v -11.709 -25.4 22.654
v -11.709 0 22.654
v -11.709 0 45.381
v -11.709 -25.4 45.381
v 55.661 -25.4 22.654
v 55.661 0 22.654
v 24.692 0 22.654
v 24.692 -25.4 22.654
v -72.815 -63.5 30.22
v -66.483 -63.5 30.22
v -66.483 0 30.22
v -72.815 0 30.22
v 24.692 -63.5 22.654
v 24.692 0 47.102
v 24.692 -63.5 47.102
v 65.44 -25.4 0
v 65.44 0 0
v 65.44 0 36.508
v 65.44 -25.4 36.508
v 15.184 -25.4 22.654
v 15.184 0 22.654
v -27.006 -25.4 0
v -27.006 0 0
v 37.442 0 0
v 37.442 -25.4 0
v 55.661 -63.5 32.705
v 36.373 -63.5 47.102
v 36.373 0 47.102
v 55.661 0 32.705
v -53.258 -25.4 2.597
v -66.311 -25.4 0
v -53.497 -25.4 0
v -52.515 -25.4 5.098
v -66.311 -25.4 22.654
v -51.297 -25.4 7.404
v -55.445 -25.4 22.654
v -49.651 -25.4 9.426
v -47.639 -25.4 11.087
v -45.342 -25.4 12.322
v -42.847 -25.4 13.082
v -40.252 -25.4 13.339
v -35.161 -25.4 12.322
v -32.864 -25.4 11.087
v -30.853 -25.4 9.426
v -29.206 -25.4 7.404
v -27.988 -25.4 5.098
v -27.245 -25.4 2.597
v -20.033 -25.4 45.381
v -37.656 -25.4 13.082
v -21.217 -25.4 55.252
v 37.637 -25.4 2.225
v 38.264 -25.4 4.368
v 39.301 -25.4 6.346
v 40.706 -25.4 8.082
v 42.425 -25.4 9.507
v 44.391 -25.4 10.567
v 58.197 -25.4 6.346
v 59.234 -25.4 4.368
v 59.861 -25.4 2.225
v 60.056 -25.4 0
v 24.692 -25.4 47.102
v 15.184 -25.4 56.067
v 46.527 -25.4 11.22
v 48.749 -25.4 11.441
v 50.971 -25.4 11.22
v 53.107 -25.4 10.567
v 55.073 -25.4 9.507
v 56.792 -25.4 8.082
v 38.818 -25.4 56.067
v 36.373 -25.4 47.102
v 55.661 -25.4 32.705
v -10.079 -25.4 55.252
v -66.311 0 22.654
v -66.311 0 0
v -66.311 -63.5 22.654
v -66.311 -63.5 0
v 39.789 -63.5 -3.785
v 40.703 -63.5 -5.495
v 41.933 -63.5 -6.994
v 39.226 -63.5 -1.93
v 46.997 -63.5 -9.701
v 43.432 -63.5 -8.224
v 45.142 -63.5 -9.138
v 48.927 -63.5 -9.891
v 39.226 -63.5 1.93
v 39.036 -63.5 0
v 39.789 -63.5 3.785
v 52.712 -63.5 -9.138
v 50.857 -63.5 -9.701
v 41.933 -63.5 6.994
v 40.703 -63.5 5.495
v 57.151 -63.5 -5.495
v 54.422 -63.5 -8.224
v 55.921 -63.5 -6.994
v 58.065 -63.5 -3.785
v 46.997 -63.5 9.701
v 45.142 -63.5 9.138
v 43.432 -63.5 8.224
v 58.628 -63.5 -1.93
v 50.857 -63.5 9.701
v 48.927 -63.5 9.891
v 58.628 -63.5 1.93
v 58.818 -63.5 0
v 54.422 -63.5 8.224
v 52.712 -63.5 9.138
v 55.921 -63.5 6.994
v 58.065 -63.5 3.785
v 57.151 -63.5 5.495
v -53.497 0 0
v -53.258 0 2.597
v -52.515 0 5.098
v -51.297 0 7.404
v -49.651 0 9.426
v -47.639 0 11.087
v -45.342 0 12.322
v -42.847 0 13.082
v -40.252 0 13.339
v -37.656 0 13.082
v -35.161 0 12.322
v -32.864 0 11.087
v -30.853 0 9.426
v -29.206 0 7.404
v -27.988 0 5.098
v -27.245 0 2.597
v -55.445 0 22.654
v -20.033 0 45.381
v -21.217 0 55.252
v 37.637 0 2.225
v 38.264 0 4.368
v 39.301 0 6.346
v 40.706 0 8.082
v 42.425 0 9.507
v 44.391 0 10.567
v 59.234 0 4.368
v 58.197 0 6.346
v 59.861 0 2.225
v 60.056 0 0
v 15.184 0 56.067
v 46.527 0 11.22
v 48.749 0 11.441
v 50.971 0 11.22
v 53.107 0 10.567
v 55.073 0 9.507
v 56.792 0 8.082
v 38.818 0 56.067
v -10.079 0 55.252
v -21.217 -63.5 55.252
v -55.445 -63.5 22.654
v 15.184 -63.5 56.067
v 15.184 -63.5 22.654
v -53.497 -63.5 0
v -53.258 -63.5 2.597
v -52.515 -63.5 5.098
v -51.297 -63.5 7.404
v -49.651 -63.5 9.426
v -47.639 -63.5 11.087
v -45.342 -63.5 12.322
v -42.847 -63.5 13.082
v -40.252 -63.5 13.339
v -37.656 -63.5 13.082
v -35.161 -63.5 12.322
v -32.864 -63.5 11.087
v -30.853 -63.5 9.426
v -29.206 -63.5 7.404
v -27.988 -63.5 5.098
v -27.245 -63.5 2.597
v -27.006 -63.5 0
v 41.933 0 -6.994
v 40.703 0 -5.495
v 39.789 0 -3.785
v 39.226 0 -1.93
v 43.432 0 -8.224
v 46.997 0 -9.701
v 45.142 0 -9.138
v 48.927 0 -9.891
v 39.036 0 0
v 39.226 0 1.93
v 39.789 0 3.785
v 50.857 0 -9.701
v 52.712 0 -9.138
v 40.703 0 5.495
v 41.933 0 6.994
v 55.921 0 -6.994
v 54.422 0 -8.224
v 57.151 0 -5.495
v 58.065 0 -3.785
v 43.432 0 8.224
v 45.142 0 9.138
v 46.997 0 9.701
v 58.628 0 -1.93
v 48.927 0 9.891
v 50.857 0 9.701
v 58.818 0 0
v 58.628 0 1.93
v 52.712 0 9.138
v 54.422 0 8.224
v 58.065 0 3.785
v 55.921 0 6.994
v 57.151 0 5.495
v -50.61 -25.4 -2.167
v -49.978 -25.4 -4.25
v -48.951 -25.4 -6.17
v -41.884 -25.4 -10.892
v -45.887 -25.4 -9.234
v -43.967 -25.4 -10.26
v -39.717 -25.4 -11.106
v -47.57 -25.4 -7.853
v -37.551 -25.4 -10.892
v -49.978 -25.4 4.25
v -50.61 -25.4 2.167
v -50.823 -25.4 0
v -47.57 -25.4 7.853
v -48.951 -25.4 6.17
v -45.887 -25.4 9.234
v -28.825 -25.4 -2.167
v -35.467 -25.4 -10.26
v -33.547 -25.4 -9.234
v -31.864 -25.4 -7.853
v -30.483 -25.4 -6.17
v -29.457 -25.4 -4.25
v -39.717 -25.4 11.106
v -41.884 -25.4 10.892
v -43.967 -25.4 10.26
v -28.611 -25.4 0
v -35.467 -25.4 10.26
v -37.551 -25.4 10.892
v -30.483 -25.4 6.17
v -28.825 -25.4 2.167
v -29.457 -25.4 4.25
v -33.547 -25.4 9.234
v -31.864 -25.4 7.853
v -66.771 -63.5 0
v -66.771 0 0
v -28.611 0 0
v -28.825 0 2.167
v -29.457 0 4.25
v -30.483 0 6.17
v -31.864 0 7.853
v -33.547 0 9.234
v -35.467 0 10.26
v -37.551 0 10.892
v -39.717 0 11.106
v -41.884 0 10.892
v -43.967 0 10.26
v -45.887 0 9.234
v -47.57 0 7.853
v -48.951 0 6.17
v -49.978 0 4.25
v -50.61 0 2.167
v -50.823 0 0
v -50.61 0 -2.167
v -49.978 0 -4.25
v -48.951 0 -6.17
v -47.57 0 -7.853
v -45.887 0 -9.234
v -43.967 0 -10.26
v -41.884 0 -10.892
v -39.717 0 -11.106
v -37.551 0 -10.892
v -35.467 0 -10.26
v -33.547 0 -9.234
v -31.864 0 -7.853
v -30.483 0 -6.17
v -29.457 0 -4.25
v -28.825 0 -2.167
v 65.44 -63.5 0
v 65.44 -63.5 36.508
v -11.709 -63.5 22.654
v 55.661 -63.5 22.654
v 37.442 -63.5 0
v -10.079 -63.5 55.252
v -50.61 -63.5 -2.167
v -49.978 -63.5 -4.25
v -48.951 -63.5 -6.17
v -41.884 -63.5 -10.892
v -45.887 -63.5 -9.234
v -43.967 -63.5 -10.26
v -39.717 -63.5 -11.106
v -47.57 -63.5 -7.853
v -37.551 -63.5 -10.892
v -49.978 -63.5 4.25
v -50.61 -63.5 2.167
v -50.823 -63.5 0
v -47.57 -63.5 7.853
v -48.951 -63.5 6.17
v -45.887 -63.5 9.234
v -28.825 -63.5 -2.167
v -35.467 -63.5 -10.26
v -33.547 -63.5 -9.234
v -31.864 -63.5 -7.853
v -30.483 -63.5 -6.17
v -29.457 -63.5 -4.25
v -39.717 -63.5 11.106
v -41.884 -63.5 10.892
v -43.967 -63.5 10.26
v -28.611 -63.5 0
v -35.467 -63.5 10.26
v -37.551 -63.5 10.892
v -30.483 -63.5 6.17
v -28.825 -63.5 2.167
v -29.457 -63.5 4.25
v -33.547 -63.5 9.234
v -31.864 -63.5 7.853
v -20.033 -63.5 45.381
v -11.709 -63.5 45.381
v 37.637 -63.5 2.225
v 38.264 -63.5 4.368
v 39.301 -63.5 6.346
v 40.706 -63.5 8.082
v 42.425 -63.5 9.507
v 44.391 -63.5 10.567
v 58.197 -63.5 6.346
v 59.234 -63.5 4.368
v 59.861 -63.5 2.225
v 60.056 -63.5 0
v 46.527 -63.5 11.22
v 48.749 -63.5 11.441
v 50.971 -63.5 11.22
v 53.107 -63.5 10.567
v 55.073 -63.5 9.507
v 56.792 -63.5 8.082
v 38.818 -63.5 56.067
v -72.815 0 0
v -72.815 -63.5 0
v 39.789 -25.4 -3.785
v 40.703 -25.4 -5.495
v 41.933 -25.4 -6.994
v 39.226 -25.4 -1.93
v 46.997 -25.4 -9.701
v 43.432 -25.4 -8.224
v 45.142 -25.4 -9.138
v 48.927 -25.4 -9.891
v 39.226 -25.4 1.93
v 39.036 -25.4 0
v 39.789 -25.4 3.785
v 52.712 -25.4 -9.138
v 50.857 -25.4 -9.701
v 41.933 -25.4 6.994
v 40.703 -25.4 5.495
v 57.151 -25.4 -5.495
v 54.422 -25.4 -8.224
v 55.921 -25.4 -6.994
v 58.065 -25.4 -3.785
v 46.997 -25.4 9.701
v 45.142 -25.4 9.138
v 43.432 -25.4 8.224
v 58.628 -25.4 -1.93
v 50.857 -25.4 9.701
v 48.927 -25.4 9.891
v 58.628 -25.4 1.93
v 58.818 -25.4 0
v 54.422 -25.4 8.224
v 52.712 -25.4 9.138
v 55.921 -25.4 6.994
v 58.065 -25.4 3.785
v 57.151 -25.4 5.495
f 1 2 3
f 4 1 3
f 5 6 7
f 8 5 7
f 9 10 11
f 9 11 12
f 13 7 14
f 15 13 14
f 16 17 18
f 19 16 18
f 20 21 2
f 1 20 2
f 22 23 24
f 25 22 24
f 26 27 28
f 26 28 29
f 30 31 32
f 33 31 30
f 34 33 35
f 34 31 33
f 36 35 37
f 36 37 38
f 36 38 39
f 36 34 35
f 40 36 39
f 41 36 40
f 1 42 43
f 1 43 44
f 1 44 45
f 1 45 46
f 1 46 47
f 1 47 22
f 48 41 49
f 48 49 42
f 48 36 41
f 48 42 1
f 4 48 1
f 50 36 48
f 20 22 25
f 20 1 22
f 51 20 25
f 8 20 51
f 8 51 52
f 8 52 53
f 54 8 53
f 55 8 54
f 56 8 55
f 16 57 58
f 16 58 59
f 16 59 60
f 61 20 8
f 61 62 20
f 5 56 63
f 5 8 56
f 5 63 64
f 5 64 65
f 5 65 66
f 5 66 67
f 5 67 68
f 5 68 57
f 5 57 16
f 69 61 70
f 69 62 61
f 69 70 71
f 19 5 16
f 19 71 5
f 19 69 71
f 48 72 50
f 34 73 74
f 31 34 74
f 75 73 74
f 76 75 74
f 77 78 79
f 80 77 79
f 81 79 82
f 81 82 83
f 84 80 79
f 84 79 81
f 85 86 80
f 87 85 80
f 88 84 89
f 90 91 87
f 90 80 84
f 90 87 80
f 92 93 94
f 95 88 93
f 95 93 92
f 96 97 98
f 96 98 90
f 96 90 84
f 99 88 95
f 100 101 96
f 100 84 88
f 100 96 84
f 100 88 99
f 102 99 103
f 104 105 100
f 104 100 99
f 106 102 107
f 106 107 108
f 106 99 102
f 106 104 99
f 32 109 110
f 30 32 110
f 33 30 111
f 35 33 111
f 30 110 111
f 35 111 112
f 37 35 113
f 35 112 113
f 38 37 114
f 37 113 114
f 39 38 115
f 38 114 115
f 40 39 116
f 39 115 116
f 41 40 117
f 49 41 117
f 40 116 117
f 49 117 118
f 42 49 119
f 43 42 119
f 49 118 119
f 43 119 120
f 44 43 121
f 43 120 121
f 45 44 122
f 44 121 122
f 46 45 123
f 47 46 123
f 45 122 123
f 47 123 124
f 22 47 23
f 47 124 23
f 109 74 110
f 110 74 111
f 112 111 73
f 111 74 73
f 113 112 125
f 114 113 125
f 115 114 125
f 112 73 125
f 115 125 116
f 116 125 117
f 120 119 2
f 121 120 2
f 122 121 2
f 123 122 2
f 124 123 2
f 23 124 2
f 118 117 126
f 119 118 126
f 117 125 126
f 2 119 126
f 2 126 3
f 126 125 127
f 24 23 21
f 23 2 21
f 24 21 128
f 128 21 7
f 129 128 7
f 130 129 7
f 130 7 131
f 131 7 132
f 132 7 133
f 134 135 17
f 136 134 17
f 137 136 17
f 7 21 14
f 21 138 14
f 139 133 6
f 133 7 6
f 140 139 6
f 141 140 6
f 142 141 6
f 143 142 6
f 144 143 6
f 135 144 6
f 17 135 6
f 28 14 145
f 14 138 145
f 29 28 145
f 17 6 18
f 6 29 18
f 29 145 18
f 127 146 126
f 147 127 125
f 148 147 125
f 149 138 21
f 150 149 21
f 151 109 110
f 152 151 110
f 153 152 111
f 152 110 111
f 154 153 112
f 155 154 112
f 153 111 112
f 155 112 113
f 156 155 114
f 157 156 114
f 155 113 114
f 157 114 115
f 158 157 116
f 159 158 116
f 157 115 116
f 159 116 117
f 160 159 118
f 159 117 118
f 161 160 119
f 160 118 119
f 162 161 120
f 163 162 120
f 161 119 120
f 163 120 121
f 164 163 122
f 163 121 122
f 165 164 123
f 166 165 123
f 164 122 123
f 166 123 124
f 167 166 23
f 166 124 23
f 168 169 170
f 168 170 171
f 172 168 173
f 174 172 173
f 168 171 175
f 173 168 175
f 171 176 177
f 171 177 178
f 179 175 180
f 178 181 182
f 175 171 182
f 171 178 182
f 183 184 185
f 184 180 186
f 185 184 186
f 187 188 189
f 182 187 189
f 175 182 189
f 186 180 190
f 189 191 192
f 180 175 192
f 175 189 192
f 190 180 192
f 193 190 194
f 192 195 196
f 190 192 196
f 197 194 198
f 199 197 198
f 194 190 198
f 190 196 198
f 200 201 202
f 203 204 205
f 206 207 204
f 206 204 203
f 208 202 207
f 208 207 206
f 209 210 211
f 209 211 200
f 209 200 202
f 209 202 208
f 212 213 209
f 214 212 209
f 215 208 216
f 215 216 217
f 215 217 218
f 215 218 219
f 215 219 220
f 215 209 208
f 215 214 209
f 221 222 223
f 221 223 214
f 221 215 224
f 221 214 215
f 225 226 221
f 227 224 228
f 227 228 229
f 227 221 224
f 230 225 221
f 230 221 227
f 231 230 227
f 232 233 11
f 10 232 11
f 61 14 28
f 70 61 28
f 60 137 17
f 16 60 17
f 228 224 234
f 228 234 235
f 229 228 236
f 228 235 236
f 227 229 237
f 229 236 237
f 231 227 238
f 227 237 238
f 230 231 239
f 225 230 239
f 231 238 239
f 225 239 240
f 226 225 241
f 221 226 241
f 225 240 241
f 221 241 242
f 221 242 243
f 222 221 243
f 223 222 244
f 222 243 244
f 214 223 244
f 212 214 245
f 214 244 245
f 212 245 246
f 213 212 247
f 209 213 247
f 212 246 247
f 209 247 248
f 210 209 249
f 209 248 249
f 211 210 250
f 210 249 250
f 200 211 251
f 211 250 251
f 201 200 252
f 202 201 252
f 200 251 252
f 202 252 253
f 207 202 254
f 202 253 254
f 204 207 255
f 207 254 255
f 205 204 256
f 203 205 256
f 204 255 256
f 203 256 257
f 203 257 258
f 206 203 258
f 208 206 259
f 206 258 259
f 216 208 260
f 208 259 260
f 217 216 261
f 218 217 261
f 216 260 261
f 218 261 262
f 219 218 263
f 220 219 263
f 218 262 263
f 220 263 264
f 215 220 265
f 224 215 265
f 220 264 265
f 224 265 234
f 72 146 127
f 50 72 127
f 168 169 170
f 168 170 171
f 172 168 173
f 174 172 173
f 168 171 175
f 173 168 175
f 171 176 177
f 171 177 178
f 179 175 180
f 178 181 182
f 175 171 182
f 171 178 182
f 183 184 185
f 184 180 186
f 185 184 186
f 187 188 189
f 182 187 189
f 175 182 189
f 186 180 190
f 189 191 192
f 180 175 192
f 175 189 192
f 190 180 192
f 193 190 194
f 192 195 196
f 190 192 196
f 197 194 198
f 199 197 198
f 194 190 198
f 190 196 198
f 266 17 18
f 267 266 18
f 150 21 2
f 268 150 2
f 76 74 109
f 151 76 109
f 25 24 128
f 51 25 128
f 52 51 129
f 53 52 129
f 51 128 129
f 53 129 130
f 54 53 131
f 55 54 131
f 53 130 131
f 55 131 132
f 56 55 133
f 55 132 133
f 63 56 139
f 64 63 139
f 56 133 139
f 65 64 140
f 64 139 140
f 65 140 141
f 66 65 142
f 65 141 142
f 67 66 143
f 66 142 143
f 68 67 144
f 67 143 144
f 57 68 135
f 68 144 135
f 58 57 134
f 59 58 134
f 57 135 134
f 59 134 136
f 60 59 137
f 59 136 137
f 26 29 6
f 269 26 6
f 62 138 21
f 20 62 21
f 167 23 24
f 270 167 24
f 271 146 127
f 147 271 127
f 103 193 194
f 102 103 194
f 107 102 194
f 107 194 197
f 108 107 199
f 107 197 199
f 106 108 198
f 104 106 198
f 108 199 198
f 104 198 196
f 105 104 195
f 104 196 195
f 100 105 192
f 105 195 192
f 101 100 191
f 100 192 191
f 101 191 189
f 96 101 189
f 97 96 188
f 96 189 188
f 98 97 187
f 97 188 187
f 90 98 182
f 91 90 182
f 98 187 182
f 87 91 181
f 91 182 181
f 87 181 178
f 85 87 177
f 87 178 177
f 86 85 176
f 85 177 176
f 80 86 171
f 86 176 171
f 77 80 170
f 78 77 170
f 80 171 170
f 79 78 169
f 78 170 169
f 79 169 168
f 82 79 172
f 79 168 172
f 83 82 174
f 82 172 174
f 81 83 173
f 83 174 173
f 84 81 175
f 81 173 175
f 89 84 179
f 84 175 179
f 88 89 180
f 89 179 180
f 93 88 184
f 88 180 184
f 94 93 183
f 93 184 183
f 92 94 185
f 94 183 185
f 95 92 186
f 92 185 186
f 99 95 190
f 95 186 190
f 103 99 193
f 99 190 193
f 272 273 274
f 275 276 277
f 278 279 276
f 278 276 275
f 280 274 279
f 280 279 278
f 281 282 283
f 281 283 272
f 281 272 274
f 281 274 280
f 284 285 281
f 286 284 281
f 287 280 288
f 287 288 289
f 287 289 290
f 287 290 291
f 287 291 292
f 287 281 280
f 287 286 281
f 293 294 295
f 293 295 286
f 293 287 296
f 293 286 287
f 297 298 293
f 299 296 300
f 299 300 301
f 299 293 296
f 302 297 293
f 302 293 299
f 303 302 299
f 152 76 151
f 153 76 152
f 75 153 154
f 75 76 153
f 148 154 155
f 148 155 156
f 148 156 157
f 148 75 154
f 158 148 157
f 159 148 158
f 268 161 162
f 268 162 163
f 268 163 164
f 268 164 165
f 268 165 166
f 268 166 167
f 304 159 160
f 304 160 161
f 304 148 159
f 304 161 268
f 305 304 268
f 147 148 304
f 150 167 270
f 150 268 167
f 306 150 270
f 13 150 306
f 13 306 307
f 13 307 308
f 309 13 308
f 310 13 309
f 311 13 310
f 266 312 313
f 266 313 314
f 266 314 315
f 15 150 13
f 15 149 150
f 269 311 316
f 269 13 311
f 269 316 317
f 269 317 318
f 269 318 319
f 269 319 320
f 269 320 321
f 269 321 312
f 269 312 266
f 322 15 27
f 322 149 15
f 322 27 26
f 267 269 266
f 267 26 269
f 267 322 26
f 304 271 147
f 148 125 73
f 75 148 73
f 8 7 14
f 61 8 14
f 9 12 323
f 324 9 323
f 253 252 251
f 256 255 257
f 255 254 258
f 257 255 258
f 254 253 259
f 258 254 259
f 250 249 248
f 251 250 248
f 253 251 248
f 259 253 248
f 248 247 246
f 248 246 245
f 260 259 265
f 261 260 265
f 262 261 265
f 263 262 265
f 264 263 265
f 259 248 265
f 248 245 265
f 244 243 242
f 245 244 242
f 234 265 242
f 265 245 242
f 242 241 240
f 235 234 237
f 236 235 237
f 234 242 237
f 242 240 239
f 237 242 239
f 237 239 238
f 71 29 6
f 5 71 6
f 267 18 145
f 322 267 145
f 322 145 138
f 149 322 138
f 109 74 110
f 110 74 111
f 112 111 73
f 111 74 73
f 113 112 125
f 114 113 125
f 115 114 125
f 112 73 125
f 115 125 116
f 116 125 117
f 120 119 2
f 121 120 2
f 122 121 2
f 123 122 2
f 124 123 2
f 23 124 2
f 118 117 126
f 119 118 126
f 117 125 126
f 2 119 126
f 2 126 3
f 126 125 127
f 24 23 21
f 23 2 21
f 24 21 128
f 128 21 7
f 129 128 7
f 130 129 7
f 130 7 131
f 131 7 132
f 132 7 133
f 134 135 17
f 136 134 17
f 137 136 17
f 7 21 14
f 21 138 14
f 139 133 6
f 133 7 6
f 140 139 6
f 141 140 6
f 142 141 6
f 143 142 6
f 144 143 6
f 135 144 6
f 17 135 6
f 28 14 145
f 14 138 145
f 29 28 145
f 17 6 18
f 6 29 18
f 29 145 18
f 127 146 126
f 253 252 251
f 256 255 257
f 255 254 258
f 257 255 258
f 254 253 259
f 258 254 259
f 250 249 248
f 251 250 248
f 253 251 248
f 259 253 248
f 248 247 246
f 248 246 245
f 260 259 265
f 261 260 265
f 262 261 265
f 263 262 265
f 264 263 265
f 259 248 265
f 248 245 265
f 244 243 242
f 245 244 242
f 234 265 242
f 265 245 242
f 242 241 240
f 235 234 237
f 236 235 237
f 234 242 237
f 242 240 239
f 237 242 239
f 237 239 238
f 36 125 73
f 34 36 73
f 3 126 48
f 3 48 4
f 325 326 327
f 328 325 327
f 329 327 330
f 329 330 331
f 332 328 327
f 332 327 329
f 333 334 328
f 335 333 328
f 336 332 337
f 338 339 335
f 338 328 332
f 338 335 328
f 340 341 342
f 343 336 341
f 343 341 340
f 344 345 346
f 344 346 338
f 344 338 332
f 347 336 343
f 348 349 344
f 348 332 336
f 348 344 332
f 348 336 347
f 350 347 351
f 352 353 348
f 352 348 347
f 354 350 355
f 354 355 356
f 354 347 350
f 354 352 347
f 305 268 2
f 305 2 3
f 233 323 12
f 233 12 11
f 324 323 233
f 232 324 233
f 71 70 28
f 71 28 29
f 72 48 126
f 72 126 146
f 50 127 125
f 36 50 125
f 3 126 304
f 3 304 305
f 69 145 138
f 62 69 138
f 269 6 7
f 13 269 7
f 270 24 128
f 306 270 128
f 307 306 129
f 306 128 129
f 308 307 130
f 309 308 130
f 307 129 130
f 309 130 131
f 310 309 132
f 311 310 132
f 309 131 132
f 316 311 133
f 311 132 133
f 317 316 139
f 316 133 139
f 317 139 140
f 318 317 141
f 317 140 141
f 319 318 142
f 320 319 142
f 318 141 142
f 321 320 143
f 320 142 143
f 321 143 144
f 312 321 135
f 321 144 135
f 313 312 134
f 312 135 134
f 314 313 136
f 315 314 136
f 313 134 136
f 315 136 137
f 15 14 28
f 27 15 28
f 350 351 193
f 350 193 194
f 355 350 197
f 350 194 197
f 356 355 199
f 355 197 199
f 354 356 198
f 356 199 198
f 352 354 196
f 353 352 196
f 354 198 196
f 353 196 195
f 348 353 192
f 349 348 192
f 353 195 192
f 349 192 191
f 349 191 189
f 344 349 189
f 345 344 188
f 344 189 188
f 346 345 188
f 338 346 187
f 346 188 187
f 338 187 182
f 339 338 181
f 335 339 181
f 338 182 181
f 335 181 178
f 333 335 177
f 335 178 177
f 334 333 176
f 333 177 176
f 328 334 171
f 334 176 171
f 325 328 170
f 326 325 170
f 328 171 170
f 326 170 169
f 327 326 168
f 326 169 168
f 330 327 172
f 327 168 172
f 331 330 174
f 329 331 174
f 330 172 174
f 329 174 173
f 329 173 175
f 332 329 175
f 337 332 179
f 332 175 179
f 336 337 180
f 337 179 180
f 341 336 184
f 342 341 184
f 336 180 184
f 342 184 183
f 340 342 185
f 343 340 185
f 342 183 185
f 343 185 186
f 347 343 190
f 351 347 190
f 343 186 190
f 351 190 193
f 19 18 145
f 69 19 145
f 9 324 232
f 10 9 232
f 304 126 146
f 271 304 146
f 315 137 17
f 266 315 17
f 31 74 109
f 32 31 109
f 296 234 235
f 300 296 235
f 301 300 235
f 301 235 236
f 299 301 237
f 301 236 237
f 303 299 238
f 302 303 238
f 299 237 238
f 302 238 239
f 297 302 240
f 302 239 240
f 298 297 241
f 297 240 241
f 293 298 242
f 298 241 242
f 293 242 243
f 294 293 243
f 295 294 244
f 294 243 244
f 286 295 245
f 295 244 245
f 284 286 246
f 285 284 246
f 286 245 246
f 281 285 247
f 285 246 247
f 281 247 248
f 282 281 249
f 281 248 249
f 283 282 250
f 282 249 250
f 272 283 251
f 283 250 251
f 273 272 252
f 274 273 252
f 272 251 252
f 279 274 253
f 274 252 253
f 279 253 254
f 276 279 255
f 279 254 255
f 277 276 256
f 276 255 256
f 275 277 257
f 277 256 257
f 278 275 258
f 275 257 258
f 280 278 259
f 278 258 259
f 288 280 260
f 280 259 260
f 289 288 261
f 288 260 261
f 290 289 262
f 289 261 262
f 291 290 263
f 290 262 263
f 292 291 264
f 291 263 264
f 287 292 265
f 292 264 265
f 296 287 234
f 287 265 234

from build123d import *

# Parameters (mm, degrees)
F0_R     = 11.1057222809
F1_DEPTH = 25.4
F0_R_2   = 9.8906413659
F0_W     = 8.3235400517
F0_H     = 22.7270985101
F2_DEPTH = 63.5
F4_DEPTH = 63.5


with BuildPart() as f1:
    # F0 (on Front) → F1 (new body)
    with BuildSketch(Plane.XZ):
        with Locations((-39.7171936929, 0)):
            Circle(F0_R)
    extrude(amount=F1_DEPTH)


with BuildPart() as f1b:
    # F0 (on Front) → F1, piece 2 (new body)
    with BuildSketch(Plane.XZ):
        with Locations((48.9269793034, 0)):
            Circle(F0_R_2)
    extrude(amount=F1_DEPTH)


with BuildPart() as f1c:
    # F0 (on Front) → F1, piece 3 (new body)
    with BuildSketch(Plane.XZ):
        with BuildLine():
            ThreePointArc((-53.4966252744, 0), (-40.2515335009, 13.3391208014), (-27.0064417273, 0))
            Line((-27.0064417273, 0), (37.442240864, 0))
            ThreePointArc((37.442240864, 0), (48.7490296364, 11.4406889954), (60.0558184087, 0))
            Line((60.0558184087, 0), (65.4400959611, 0))
            Line((65.4400959611, 0), (65.4400959611, 36.5078896284))
            Line((65.4400959611, 36.5078896284), (38.8181619346, 56.0668669641))
            Line((38.8181619346, 56.0668669641), (15.1843968779, 56.0668669641))
            Line((15.1843968779, 56.0668669641), (15.1843968779, 22.6536151022))
            Line((15.1843968779, 22.6536151022), (-11.709199287, 22.6536151022))
            Line((-11.709199287, 22.6536151022), (-20.0327393387, 22.6536151022))
            Line((-20.0327393387, 22.6536151022), (-42.9492332041, 22.6536151022))
            Line((-42.9492332041, 22.6536151022), (-55.4452463984, 22.6536151022))
            Line((-55.4452463984, 22.6536151022), (-66.3113445044, 22.6536151022))
            Line((-66.3113445044, 22.6536151022), (-66.3113445044, 0))
            Line((-66.3113445044, 0), (-53.4966252744, 0))
        make_face()
        Polygon((55.6606091559, 22.6536151022), (24.6922299266, 22.6536151022), (24.6922299266, 47.1023358405), (36.3732911646, 47.1023358405), (55.6606091559, 32.7047556639), align=None, mode=Mode.SUBTRACT)
        Polygon((-21.2170351297, 55.2519075572), (-55.4452463984, 22.6536151022), (-42.9492332041, 22.6536151022), (-20.0327393387, 45.3807136122), (-10.0792841986, 55.2519075572), align=None)
        Polygon((-20.0327393387, 45.3807136122), (-42.9492332041, 22.6536151022), (-20.0327393387, 22.6536151022), align=None)
        with Locations((-15.8709693129, 34.0171643572)):
            Rectangle(F0_W, F0_H)
    extrude(amount=F1_DEPTH)


with BuildPart() as f2:
    # F0 (on Front) → F2 (new body)
    with BuildSketch(Plane.XZ):
        with Locations((-39.7171936929, 0)):
            Circle(F0_R)
    extrude(amount=F2_DEPTH)


with BuildPart() as f2b:
    # F0 (on Front) → F2, piece 2 (new body)
    with BuildSketch(Plane.XZ):
        with Locations((48.9269793034, 0)):
            Circle(F0_R_2)
    extrude(amount=F2_DEPTH)


with BuildPart() as f2c:
    # F0 (on Front) → F2, piece 3 (new body)
    with BuildSketch(Plane.XZ):
        with BuildLine():
            ThreePointArc((-53.4966252744, 0), (-40.2515335009, 13.3391208014), (-27.0064417273, 0))
            Line((-27.0064417273, 0), (37.442240864, 0))
            ThreePointArc((37.442240864, 0), (48.7490296364, 11.4406889954), (60.0558184087, 0))
            Line((60.0558184087, 0), (65.4400959611, 0))
            Line((65.4400959611, 0), (65.4400959611, 36.5078896284))
            Line((65.4400959611, 36.5078896284), (38.8181619346, 56.0668669641))
            Line((38.8181619346, 56.0668669641), (15.1843968779, 56.0668669641))
            Line((15.1843968779, 56.0668669641), (15.1843968779, 22.6536151022))
            Line((15.1843968779, 22.6536151022), (-11.709199287, 22.6536151022))
            Line((-11.709199287, 22.6536151022), (-20.0327393387, 22.6536151022))
            Line((-20.0327393387, 22.6536151022), (-42.9492332041, 22.6536151022))
            Line((-42.9492332041, 22.6536151022), (-55.4452463984, 22.6536151022))
            Line((-55.4452463984, 22.6536151022), (-66.3113445044, 22.6536151022))
            Line((-66.3113445044, 22.6536151022), (-66.3113445044, 0))
            Line((-66.3113445044, 0), (-53.4966252744, 0))
        make_face()
        Polygon((55.6606091559, 22.6536151022), (24.6922299266, 22.6536151022), (24.6922299266, 47.1023358405), (36.3732911646, 47.1023358405), (55.6606091559, 32.7047556639), align=None, mode=Mode.SUBTRACT)
        Polygon((-21.2170351297, 55.2519075572), (-55.4452463984, 22.6536151022), (-42.9492332041, 22.6536151022), (-20.0327393387, 45.3807136122), (-10.0792841986, 55.2519075572), align=None)
        Polygon((-20.0327393387, 45.3807136122), (-42.9492332041, 22.6536151022), (-20.0327393387, 22.6536151022), align=None)
        with Locations((-15.8709693129, 34.0171643572)):
            Rectangle(F0_W, F0_H)
    extrude(amount=F2_DEPTH)


with BuildPart() as f4:
    # F3 (on Front) → F4 (new body)
    with BuildSketch(Plane.XZ):
        Polygon((-72.8148594499, 0), (-66.7709335685, 0), (-66.4831325412, 30.2196051925), (-72.8148594499, 30.2196051925), align=None)
    extrude(amount=F4_DEPTH)


solid = Compound([f1.part, f1b.part, f1c.part, f2.part, f2b.part, f2c.part, f4.part])
